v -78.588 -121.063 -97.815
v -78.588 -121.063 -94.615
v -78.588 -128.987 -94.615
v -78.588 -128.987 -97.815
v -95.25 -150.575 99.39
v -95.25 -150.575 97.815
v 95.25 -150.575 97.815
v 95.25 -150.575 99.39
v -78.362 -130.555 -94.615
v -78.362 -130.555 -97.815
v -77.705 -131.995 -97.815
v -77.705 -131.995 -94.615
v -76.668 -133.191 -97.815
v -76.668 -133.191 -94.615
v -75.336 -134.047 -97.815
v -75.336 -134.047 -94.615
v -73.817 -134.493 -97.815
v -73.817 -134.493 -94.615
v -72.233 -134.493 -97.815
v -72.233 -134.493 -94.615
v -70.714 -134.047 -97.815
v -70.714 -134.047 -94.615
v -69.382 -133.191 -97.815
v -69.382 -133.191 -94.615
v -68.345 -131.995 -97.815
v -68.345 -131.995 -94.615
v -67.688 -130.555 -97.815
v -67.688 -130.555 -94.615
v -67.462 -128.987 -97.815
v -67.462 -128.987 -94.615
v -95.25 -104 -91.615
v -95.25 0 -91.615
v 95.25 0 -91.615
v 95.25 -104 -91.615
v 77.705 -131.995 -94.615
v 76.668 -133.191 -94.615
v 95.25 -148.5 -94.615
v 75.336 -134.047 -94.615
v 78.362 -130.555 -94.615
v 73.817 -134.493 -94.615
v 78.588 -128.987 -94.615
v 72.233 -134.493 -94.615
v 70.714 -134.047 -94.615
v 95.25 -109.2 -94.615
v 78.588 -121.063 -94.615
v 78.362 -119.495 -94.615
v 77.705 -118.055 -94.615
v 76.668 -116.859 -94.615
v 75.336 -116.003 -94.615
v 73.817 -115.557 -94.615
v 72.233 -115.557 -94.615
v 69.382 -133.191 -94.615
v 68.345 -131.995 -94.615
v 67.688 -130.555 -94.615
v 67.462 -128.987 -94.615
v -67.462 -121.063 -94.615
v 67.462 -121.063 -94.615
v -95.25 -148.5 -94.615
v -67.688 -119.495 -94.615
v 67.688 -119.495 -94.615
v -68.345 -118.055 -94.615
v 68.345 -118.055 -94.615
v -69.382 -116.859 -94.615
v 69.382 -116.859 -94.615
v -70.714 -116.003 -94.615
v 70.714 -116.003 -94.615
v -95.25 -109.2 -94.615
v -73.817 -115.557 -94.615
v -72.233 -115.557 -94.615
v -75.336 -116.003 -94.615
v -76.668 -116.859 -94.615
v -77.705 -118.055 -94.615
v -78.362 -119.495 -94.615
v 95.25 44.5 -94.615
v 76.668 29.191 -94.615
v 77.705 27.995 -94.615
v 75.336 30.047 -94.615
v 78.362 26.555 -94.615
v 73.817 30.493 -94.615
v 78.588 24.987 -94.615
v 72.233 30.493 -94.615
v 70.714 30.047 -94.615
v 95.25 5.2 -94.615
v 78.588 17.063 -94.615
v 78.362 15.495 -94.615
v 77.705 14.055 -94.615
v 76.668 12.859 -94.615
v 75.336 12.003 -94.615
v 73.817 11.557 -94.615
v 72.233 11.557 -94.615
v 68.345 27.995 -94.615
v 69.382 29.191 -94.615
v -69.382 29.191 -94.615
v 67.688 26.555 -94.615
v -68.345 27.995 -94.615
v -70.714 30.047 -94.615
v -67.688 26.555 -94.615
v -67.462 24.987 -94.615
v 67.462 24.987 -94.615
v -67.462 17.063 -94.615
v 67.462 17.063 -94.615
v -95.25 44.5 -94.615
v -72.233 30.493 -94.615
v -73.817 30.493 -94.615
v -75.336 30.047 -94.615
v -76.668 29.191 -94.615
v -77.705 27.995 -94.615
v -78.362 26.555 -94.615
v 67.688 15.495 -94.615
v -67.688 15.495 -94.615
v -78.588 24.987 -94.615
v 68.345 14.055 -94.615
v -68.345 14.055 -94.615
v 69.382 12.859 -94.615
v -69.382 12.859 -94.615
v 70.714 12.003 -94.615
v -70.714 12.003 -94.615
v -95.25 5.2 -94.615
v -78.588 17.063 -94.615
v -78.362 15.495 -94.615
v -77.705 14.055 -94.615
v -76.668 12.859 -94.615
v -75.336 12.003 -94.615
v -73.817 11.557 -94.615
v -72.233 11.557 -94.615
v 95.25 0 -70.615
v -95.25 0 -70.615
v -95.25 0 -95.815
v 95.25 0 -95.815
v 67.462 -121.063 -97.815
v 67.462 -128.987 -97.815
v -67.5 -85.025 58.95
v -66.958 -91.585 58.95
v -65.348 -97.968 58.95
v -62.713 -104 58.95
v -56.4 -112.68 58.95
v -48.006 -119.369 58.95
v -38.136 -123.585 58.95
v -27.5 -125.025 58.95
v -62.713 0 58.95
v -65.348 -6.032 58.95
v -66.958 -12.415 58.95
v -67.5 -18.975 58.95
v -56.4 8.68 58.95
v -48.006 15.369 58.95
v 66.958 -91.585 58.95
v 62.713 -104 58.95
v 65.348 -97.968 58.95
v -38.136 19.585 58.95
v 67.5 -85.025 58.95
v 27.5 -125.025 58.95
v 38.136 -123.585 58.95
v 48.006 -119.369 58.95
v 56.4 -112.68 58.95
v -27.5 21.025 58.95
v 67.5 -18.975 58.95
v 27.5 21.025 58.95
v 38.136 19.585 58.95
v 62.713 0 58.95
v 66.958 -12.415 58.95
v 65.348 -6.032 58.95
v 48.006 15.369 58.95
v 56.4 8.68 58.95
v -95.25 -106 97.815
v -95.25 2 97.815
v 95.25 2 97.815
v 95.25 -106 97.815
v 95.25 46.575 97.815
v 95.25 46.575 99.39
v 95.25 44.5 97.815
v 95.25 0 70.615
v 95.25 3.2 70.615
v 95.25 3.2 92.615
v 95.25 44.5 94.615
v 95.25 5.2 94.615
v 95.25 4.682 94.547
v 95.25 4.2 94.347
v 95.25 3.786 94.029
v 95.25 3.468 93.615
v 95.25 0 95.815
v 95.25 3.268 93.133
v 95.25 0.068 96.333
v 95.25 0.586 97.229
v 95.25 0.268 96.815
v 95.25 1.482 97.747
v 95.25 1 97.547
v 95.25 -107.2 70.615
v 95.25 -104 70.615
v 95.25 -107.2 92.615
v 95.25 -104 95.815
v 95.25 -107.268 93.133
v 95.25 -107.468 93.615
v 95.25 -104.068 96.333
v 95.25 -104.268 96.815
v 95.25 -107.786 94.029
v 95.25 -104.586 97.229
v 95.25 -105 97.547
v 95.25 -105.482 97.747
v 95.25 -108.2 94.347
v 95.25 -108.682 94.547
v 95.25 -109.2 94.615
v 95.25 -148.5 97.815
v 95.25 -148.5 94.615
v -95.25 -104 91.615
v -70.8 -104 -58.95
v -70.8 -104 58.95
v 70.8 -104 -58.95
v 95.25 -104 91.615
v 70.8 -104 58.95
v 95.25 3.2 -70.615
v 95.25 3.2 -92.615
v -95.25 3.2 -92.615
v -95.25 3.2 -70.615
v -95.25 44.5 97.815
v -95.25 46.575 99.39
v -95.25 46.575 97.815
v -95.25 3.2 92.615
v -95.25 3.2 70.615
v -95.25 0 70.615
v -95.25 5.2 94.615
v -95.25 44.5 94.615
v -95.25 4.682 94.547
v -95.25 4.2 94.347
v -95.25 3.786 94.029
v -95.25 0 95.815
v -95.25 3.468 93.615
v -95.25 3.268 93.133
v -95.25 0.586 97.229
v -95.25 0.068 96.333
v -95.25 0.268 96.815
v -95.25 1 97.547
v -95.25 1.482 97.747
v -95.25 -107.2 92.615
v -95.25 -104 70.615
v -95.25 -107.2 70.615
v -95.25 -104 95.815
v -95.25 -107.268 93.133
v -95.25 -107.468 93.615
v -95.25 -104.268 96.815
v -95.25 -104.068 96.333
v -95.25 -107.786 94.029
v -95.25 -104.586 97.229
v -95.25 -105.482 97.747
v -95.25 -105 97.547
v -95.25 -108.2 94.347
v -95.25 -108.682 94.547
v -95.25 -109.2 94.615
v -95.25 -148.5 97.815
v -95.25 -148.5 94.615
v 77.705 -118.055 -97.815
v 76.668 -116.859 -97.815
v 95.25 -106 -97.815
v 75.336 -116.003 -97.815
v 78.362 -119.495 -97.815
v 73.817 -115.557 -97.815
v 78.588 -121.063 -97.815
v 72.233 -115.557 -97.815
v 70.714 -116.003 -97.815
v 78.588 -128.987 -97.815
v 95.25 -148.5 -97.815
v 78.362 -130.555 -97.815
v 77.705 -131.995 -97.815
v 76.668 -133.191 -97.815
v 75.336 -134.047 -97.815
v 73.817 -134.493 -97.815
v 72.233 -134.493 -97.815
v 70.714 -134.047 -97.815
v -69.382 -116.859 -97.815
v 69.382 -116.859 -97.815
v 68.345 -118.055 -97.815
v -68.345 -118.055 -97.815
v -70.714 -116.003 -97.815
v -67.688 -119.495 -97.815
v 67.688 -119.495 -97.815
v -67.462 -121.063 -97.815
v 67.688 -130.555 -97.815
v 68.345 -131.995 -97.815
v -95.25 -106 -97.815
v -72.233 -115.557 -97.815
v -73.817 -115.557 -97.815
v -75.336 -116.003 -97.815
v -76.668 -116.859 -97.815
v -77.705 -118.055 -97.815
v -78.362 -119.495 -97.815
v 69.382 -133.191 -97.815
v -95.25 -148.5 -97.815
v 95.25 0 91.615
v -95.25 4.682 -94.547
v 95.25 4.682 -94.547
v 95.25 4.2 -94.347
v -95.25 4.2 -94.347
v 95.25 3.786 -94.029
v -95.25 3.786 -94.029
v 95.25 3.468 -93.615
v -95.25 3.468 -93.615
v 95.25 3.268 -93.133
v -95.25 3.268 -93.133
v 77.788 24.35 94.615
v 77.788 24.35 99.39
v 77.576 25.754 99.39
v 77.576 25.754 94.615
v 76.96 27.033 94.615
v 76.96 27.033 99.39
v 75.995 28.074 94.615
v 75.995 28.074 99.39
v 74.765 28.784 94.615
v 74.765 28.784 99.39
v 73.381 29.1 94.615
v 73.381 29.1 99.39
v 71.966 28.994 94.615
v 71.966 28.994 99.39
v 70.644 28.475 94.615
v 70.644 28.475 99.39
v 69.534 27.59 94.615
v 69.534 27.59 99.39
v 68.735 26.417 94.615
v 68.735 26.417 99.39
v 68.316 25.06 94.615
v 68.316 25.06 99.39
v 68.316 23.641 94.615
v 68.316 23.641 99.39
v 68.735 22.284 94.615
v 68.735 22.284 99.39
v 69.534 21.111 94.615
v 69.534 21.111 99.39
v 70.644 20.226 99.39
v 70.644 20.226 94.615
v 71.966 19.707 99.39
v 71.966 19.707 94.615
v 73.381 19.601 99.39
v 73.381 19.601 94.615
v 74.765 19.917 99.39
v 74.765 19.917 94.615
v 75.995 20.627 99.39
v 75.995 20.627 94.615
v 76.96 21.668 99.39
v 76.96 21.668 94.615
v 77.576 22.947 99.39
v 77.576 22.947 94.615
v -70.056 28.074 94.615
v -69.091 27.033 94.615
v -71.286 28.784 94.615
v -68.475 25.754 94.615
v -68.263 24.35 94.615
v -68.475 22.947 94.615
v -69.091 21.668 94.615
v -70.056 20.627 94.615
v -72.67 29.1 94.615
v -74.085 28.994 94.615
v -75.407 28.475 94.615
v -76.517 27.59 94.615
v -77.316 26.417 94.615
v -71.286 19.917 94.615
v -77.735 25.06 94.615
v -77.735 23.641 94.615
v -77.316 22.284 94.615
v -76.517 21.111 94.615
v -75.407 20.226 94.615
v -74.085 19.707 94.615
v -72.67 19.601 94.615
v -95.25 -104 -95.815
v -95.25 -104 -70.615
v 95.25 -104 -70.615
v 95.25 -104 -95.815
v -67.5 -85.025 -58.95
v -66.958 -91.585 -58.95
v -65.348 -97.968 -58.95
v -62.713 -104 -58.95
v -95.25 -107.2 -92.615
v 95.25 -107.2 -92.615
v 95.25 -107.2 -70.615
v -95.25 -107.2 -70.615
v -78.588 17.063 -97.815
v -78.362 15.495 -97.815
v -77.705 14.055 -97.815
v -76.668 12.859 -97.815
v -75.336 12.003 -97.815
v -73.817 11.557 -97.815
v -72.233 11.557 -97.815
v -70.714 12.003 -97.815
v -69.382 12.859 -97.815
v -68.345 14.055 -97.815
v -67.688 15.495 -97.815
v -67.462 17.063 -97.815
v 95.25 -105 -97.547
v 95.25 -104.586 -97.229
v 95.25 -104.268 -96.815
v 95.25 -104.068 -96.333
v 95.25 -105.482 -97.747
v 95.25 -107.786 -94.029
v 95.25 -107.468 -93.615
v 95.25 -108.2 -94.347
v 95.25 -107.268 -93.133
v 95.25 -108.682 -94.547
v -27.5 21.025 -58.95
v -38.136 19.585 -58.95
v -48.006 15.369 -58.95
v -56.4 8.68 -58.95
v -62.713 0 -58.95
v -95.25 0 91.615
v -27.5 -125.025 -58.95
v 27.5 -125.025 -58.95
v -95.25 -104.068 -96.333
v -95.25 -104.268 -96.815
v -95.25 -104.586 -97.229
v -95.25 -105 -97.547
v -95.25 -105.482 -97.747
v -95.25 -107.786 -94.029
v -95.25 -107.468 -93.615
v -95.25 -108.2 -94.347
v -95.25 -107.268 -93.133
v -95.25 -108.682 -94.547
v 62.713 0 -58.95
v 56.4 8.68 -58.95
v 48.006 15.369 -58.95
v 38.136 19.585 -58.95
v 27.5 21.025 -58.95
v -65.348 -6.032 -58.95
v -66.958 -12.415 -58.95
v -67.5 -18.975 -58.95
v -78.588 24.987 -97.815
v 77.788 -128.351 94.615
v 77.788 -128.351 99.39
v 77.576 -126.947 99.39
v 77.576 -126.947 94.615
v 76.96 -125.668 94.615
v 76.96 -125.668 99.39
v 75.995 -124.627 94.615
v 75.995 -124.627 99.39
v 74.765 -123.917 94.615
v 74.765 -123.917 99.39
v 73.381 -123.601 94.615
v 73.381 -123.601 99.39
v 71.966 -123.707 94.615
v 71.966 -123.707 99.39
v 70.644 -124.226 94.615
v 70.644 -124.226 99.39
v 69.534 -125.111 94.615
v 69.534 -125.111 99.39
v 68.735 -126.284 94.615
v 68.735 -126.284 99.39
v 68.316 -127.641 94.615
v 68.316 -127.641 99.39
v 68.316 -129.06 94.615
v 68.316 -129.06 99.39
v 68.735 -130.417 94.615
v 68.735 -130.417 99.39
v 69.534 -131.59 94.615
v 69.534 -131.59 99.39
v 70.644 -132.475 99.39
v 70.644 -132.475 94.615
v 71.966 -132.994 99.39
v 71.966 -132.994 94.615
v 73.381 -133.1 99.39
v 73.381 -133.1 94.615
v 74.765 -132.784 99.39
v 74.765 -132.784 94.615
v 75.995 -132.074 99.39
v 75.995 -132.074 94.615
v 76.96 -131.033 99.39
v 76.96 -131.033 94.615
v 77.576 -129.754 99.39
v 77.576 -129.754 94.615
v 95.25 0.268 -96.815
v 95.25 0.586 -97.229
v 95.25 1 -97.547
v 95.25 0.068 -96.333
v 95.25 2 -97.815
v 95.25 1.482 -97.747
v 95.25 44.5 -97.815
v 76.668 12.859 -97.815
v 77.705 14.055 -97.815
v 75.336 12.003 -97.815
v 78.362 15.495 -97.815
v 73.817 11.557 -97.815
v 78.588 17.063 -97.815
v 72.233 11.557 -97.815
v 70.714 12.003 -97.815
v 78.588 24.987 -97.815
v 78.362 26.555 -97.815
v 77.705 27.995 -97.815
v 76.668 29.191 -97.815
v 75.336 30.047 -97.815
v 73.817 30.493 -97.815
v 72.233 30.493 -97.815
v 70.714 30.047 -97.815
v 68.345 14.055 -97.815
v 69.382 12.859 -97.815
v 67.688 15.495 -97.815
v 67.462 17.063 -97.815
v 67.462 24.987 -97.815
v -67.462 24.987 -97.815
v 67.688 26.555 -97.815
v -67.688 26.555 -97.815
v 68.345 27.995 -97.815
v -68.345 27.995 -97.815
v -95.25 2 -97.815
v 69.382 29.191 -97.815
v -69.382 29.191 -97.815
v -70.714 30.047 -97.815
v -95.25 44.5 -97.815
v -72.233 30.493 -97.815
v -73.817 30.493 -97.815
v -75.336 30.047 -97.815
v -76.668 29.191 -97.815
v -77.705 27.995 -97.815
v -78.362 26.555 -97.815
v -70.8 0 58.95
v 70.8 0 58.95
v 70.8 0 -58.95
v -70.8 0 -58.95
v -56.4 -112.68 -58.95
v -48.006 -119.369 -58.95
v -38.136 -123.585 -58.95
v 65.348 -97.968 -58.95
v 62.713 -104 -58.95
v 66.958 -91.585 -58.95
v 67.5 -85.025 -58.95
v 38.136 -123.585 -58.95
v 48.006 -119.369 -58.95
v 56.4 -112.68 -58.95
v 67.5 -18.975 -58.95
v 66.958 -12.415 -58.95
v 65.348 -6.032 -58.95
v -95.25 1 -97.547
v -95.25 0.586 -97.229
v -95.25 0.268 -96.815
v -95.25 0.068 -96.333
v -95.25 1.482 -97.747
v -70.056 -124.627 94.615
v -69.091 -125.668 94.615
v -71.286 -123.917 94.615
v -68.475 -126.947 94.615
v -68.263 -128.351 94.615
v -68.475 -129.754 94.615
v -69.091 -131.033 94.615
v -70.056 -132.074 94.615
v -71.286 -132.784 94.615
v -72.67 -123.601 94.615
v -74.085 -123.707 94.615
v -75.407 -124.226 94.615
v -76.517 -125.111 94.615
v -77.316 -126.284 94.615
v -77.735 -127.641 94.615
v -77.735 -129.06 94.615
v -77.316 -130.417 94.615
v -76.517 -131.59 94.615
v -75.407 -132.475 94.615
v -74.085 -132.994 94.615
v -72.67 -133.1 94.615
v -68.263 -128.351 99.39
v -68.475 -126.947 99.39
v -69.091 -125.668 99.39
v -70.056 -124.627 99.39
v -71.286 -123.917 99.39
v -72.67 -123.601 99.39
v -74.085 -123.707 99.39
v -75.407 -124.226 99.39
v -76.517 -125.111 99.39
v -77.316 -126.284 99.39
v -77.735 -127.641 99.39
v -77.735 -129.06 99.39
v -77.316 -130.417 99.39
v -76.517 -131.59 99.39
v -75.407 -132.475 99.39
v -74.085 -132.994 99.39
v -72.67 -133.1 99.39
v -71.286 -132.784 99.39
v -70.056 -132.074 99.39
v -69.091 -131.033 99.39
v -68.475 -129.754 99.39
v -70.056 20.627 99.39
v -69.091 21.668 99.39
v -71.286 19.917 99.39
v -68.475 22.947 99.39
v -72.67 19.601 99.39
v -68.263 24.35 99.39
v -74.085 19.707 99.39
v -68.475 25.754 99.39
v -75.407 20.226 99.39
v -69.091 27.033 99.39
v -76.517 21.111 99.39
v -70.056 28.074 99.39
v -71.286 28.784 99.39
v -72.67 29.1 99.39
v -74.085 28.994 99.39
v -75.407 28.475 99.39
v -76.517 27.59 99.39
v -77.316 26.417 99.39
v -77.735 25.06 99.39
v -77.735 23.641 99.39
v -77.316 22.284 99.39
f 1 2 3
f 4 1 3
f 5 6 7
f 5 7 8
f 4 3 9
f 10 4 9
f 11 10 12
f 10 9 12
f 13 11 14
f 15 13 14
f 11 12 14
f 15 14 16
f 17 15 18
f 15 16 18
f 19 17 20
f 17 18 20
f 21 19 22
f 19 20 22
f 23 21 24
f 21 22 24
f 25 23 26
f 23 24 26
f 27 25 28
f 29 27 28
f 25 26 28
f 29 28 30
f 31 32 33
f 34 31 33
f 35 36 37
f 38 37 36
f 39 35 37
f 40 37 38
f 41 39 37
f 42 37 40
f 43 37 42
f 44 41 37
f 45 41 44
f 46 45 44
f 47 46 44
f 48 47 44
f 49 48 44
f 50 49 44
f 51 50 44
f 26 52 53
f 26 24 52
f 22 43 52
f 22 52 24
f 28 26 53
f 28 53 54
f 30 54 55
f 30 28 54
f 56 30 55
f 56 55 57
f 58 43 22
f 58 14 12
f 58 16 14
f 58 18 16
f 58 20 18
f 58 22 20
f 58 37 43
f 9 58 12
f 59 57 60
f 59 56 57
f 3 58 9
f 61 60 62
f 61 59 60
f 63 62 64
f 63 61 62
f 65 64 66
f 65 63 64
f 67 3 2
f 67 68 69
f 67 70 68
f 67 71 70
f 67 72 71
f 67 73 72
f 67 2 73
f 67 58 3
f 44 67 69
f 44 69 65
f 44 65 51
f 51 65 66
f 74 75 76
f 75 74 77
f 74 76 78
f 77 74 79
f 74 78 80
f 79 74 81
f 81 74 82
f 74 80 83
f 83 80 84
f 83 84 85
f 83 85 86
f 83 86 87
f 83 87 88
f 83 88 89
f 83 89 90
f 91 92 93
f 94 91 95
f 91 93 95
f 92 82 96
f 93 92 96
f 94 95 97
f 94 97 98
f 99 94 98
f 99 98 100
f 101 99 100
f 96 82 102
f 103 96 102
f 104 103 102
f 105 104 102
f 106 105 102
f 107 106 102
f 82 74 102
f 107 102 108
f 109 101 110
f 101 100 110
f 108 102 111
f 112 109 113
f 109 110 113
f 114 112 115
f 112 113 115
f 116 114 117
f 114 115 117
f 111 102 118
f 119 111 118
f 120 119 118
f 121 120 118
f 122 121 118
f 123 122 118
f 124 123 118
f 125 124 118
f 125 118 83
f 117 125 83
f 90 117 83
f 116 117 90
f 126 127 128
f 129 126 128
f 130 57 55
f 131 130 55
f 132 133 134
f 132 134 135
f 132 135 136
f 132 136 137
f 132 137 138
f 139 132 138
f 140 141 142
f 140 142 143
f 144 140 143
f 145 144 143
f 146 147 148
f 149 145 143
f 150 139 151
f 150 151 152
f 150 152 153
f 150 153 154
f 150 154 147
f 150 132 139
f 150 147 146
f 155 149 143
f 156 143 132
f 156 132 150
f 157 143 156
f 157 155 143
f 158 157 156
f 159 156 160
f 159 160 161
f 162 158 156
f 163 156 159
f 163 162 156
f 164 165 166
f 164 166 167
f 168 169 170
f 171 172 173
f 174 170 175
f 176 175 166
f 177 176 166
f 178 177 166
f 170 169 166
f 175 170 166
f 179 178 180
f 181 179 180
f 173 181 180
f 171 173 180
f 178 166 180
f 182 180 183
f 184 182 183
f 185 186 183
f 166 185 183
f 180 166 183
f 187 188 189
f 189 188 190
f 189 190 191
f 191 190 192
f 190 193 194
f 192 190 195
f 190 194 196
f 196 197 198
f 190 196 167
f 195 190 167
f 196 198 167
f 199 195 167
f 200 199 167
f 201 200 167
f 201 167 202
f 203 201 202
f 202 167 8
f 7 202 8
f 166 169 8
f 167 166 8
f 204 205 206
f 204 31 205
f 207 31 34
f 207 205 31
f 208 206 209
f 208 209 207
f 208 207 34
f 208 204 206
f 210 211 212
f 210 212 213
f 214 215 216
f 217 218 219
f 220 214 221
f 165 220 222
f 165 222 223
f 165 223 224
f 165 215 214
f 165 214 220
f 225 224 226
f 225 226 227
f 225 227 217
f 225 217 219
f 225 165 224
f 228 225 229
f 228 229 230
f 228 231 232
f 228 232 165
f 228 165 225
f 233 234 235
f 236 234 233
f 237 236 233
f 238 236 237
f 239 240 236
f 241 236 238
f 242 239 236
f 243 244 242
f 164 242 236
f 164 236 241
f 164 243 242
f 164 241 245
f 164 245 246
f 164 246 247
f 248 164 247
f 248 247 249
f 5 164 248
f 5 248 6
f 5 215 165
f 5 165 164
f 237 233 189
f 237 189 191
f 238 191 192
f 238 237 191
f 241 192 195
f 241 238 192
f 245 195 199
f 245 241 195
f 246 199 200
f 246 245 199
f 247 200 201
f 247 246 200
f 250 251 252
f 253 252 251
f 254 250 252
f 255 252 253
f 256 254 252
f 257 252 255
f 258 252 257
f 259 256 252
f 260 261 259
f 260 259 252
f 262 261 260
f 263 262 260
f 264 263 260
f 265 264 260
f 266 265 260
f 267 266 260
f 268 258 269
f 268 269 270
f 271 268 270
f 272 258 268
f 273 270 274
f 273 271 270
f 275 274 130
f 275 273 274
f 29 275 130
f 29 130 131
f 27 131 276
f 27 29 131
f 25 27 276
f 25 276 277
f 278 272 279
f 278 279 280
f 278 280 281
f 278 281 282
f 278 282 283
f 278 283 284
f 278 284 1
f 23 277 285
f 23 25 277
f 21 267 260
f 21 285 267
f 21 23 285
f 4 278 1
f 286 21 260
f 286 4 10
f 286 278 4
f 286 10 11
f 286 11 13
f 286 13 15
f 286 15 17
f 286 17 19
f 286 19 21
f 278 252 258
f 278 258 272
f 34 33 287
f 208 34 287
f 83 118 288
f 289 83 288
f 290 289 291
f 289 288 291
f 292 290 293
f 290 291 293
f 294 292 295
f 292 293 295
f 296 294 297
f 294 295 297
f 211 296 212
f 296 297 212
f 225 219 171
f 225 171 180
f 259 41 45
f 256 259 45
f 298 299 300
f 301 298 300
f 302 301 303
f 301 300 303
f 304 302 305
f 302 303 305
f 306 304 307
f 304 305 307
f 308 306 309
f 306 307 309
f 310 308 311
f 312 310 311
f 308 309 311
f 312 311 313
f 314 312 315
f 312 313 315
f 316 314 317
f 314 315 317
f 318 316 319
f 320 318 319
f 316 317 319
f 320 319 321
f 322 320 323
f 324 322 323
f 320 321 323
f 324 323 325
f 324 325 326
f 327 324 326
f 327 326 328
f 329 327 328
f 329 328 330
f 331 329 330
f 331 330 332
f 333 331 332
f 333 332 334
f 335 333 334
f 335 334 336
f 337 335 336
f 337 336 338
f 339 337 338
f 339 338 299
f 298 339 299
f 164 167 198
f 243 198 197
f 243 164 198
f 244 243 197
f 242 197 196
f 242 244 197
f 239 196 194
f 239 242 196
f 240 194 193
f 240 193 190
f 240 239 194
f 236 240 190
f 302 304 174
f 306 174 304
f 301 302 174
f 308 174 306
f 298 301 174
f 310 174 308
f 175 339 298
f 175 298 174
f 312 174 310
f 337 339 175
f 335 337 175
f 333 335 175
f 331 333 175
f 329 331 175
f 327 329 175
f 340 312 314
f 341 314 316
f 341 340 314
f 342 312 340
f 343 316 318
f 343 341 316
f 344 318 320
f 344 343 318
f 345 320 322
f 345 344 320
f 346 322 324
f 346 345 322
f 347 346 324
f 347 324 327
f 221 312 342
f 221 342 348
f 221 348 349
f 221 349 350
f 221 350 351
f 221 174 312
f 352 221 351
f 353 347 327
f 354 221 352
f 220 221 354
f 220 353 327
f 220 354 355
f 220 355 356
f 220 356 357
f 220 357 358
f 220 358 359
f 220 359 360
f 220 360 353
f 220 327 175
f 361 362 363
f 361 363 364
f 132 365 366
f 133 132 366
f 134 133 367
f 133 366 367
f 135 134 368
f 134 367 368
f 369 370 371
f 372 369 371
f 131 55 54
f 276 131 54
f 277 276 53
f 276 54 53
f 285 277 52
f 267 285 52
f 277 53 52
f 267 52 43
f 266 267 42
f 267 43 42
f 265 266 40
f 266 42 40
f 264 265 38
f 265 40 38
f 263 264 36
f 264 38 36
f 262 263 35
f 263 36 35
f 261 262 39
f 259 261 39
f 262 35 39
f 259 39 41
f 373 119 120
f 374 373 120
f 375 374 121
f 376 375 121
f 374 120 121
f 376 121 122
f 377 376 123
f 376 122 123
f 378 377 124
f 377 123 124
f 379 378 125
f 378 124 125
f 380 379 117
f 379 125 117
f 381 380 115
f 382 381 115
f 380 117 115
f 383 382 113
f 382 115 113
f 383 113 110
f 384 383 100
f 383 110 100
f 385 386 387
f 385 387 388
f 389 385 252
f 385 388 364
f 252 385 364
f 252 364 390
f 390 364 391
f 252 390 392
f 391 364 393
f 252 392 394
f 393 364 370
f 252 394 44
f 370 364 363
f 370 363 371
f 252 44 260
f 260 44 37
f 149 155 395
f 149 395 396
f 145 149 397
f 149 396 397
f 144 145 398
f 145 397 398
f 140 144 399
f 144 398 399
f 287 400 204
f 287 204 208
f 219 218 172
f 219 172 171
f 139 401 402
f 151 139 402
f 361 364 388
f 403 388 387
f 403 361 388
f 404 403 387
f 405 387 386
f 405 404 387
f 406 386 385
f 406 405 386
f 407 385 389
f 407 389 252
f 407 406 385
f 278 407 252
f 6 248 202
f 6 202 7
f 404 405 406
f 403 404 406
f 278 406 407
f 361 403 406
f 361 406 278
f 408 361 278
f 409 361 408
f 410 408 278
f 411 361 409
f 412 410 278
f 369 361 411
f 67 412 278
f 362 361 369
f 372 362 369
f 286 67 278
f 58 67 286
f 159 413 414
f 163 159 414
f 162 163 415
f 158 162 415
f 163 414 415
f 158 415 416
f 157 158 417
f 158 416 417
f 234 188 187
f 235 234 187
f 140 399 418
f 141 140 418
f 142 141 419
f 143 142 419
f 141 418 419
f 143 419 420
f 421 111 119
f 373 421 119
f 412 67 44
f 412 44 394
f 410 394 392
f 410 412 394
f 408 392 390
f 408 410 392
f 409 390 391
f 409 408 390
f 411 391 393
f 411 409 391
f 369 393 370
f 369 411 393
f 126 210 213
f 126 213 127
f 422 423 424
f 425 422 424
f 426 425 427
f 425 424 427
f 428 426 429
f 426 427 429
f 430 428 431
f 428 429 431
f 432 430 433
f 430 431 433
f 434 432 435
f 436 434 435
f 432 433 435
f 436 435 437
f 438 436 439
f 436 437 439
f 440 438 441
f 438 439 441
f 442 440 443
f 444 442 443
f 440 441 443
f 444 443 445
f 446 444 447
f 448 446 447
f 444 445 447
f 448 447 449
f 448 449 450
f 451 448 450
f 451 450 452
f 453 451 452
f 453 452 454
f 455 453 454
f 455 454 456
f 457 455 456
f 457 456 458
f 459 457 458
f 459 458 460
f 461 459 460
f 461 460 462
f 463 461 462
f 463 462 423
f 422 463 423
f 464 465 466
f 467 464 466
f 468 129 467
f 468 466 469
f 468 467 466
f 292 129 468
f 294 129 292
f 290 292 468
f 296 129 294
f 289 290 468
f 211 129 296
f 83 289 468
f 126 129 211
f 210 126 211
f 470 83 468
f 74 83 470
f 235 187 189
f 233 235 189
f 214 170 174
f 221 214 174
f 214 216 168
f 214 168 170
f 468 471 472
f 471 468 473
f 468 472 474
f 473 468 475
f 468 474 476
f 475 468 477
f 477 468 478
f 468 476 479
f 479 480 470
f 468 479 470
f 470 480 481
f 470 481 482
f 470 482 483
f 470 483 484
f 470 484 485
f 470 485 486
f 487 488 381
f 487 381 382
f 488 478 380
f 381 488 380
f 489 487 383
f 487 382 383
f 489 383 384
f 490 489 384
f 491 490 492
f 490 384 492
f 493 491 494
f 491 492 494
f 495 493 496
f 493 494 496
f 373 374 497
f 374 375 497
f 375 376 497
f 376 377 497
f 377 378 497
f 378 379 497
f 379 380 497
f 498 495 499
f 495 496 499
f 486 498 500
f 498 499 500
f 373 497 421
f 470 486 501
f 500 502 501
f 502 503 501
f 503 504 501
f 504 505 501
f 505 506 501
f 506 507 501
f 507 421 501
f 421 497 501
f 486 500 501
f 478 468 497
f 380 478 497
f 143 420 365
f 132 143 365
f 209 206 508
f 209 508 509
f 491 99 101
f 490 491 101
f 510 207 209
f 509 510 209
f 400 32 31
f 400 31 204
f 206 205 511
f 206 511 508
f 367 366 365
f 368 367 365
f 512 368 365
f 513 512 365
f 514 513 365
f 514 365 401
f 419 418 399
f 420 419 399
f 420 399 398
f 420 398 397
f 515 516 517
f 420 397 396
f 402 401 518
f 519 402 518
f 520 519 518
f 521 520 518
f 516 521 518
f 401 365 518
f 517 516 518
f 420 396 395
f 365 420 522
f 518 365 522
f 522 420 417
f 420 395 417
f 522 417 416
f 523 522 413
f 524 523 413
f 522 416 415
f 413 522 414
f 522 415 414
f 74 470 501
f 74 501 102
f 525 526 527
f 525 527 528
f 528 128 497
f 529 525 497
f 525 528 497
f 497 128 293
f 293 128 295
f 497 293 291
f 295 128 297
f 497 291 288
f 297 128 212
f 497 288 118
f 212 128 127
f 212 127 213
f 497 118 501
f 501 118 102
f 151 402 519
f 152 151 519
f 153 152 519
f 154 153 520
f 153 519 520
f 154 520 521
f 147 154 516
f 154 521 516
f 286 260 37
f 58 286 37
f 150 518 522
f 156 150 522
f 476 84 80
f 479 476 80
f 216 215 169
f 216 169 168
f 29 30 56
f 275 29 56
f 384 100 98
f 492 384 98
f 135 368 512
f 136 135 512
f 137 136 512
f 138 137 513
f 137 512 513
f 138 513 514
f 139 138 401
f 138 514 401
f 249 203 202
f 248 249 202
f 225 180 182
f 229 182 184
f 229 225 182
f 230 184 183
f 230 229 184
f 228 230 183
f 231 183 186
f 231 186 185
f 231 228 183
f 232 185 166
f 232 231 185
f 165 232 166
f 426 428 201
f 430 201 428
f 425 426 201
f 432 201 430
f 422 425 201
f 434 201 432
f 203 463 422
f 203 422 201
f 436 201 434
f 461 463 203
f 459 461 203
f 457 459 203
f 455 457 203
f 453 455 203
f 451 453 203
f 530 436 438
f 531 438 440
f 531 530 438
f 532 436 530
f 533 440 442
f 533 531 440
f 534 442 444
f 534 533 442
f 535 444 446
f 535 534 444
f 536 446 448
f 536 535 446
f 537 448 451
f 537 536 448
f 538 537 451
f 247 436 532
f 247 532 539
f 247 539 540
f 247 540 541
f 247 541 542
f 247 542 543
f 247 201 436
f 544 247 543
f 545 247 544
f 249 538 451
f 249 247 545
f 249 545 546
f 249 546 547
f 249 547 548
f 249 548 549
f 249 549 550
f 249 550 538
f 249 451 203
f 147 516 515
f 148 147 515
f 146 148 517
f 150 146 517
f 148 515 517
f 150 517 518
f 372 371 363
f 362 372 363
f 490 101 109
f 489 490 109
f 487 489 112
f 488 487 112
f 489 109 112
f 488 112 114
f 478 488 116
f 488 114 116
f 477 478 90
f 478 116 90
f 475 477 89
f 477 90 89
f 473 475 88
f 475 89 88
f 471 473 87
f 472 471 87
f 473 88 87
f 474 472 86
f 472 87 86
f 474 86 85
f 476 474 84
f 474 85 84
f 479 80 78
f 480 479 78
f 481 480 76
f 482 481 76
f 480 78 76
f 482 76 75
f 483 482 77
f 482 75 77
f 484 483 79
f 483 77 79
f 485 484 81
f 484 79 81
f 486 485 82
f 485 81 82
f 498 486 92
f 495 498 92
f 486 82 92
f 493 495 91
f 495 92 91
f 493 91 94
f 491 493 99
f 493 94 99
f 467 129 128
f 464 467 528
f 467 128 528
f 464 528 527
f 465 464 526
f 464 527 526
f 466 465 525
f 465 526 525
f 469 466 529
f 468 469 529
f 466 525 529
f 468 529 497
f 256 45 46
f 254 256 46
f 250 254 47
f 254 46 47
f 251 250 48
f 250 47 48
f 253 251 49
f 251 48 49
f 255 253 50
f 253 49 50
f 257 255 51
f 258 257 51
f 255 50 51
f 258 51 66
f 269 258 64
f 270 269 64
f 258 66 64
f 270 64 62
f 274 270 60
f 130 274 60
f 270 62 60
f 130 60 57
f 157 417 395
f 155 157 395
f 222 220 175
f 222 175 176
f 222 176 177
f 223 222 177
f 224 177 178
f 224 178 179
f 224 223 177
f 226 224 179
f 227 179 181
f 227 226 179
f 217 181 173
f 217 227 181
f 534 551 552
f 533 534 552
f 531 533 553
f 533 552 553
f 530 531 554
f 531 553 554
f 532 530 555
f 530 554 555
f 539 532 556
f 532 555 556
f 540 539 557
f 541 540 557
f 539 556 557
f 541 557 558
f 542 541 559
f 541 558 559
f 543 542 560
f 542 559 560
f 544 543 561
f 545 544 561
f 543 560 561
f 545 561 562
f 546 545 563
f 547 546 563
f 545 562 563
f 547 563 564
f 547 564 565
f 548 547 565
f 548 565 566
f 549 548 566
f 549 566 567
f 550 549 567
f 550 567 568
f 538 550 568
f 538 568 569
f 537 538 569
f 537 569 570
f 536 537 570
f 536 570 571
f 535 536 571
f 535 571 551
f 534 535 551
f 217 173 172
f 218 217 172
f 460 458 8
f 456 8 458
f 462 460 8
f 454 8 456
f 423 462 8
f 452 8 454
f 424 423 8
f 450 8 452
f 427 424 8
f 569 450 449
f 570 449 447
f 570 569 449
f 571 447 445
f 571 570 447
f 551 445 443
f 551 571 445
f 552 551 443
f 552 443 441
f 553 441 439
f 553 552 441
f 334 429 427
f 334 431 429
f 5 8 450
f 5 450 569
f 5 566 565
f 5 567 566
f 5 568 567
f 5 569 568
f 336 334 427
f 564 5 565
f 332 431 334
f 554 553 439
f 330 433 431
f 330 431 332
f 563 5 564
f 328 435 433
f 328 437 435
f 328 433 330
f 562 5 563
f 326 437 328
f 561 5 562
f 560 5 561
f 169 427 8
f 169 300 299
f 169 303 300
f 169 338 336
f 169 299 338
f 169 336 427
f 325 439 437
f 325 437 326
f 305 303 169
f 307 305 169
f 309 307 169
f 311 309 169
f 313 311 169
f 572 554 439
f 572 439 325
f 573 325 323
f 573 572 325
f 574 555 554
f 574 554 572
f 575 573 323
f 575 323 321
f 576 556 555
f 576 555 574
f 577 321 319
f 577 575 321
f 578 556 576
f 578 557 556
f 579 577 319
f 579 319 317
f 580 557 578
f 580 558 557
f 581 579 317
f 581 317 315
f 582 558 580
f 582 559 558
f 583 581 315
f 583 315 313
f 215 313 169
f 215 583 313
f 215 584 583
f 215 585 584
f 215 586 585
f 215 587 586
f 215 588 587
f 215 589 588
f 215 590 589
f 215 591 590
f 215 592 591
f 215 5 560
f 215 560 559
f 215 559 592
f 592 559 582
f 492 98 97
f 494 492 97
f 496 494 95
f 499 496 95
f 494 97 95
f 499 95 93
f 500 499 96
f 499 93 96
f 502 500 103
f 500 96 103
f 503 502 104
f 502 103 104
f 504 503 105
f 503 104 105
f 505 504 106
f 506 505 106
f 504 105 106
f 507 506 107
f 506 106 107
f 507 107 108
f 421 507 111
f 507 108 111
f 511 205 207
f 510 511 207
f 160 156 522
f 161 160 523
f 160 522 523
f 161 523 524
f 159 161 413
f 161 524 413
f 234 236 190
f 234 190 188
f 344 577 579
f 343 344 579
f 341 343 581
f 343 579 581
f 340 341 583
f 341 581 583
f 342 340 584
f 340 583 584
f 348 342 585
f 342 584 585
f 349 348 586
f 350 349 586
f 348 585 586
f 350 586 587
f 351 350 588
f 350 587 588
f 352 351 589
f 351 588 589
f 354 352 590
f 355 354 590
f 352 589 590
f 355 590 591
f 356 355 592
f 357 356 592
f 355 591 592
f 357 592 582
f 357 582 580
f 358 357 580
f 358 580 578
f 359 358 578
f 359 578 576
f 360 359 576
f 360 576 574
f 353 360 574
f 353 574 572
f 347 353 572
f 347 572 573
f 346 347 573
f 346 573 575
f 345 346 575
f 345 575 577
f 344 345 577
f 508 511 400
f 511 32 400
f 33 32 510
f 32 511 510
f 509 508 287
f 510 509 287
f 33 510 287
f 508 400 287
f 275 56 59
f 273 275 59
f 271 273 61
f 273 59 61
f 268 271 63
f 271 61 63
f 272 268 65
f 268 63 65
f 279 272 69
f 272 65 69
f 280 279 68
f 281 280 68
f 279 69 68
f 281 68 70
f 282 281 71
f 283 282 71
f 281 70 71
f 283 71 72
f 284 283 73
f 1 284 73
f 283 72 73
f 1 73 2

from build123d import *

# Parameters (mm, degrees)
F0_W      = 190.5
F0_H      = 183.23
F1_DEPTH  = 104
F3_DEPTH  = 190.5
F9_DEPTH  = 3.201
F10_W     = 141.6
F10_H     = 117.9
F11_DEPTH = 150.576
F13_DEPTH = 117.9
F14_R     = 4.7625
F15_DEPTH = 25


with BuildPart() as f1:
    # F0 (on Front) → F1 (new body)
    with BuildSketch(Plane.XZ):
        Rectangle(F0_W, F0_H)
    extrude(amount=F1_DEPTH)

    # F10 (on face) → F11 (cut, through all)
    with BuildSketch(Plane.XZ.offset(104)):
        Rectangle(F10_W, F10_H)
    extrude(amount=-F11_DEPTH, mode=Mode.SUBTRACT)


with BuildPart() as f3:
    # F2 (on face) → F3 (new body, through all)
    with BuildSketch(Plane(origin=(-95.25, 0, 0), x_dir=(0, -1, 0), z_dir=(-1, 0, 0))):
        with BuildLine():
            Line((-3.2, 70.615), (0, 70.615))
            Line((0, 70.615), (0, 91.615))
            Line((0, 91.615), (0, 94.615))
            Line((0, 94.615), (0, 95.815))
            ThreePointArc((0, 95.815), (-0.5857864376, 97.2292135624), (-2, 97.815))
            Line((-2, 97.815), (-44.5, 97.815))
            Line((-44.5, 97.815), (-44.5, 94.615))
            Line((-44.5, 94.615), (-5.2, 94.615))
            ThreePointArc((-5.2, 94.615), (-3.7857864376, 94.0292135624), (-3.2, 92.615))
            Line((-3.2, 92.615), (-3.2, 70.615))
        make_face()
        with BuildLine():
            Line((104, 91.615), (104, 70.615))
            Line((104, 70.615), (107.2, 70.615))
            Line((107.2, 70.615), (107.2, 92.615))
            ThreePointArc((107.2, 92.615), (107.7857864376, 94.0292135624), (109.2, 94.615))
            Line((109.2, 94.615), (148.5, 94.615))
            Line((148.5, 94.615), (148.5, 97.815))
            Line((148.5, 97.815), (106, 97.815))
            ThreePointArc((106, 97.815), (104.5857864376, 97.2292135624), (104, 95.815))
            Line((104, 95.815), (104, 94.615))
            Line((104, 94.615), (104, 91.615))
        make_face()
        Polygon((-2, 97.815), (106, 97.815), (148.5, 97.815), (150.575, 97.815), (150.575, 99.39), (-46.575, 99.39), (-46.575, 97.815), (-44.5, 97.815), align=None)
    extrude(amount=-F3_DEPTH)

    # F14 (on face) → F15 (cut)
    with BuildSketch(Plane.XY.offset(99.39)):
        with Locations((-73.0255, 24.3505)):
            Circle(F14_R)
        with Locations((73.0255, 24.3505)):
            Circle(F14_R)
        with Locations((-73.0255, -128.3505)):
            Circle(F14_R)
        with Locations((73.0255, -128.3505)):
            Circle(F14_R)
    extrude(amount=-F15_DEPTH, mode=Mode.SUBTRACT)


with BuildPart() as f3b:
    # F2 (on face) → F3, piece 2 (new body, through all)
    with BuildSketch(Plane(origin=(-95.25, 0, 0), x_dir=(0, -1, 0), z_dir=(-1, 0, 0))):
        with BuildLine():
            Line((107.2, -70.615), (104, -70.615))
            Line((104, -70.615), (104, -91.615))
            Line((104, -91.615), (104, -94.615))
            Line((104, -94.615), (104, -95.815))
            ThreePointArc((104, -95.815), (104.5857864376, -97.2292135624), (106, -97.815))
            Line((106, -97.815), (148.5, -97.815))
            Line((148.5, -97.815), (148.5, -94.615))
            Line((148.5, -94.615), (109.2, -94.615))
            ThreePointArc((109.2, -94.615), (107.7857864376, -94.0292135624), (107.2, -92.615))
            Line((107.2, -92.615), (107.2, -70.615))
        make_face()
    extrude(amount=-F3_DEPTH)


with BuildPart() as f7_1:
    # F7: instance of F3b
    add(f3b.part.mirror(Plane(origin=(95.25, -52, 0), x_dir=(-1, 0, 0), z_dir=(0, 1, 0))))


with BuildPart() as f9_tool:
    # F8 (on face) → F9 (new body, through all)
    with BuildSketch(Plane.XY.offset(-94.615)):
        with BuildLine():
            Line((-67.4624, -128.9874), (-67.4624, -121.0626))
            ThreePointArc((-67.4624, -121.0626), (-73.025, -115.5), (-78.5876, -121.0626))
            Line((-78.5876, -121.0626), (-78.5876, -128.9874))
            ThreePointArc((-78.5876, -128.9874), (-73.025, -134.55), (-67.4624, -128.9874))
        make_face()
        with BuildLine():
            ThreePointArc((-67.4624, 24.9874), (-73.025, 30.55), (-78.5876, 24.9874))
            Line((-78.5876, 24.9874), (-78.5876, 17.0626))
            ThreePointArc((-78.5876, 17.0626), (-73.025, 11.5), (-67.4624, 17.0626))
            Line((-67.4624, 17.0626), (-67.4624, 24.9874))
        make_face()
        with BuildLine():
            ThreePointArc((78.5876, -121.0626), (73.025, -115.5), (67.4624, -121.0626))
            Line((67.4624, -121.0626), (67.4624, -128.9874))
            ThreePointArc((67.4624, -128.9874), (73.025, -134.55), (78.5876, -128.9874))
            Line((78.5876, -128.9874), (78.5876, -121.0626))
        make_face()
        with BuildLine():
            Line((67.4624, 24.9874), (67.4624, 17.0626))
            ThreePointArc((67.4624, 17.0626), (73.025, 11.5), (78.5876, 17.0626))
            Line((78.5876, 17.0626), (78.5876, 24.9874))
            ThreePointArc((78.5876, 24.9874), (73.025, 30.55), (67.4624, 24.9874))
        make_face()
    extrude(amount=-F9_DEPTH)


with BuildPart() as f3b_1:
    add(f3b.part)

    # F9: cut by f9_tool
    add(f9_tool.part, mode=Mode.SUBTRACT)


with BuildPart() as f7_1_1:
    add(f7_1.part)

    # F9: cut by f9_tool
    add(f9_tool.part, mode=Mode.SUBTRACT)


with BuildPart() as f13:
    # F12 (on face) → F13 (new body, through all)
    with BuildSketch(Plane.XY.offset(-58.95)):
        with BuildLine():
            ThreePointArc((-67.5, -85.025), (-66.2847688892, -94.8097688892), (-62.7129148893, -104))
            Line((-62.7129148893, -104), (62.7129148893, -104))
            ThreePointArc((62.7129148893, -104), (66.2847688892, -94.8097688892), (67.5, -85.025))
            Line((67.5, -85.025), (67.5, -18.975))
            ThreePointArc((67.5, -18.975), (66.2847688892, -9.1902311108), (62.7129148893, 0))
            Line((62.7129148893, 0), (-62.7129148893, 0))
            ThreePointArc((-62.7129148893, 0), (-66.2847688892, -9.1902311108), (-67.5, -18.975))
            Line((-67.5, -18.975), (-67.5, -85.025))
        make_face()
        with BuildLine():
            ThreePointArc((-27.5, 21.025), (-48.0060966544, 15.3688495221), (-62.7129148893, 0))
            Line((-62.7129148893, 0), (62.7129148893, 0))
            ThreePointArc((62.7129148893, 0), (48.0060966544, 15.3688495221), (27.5, 21.025))
            Line((27.5, 21.025), (-27.5, 21.025))
        make_face()
        with BuildLine():
            ThreePointArc((-62.7129148893, -104), (-48.0060966544, -119.3688495221), (-27.5, -125.025))
            Line((-27.5, -125.025), (27.5, -125.025))
            ThreePointArc((27.5, -125.025), (48.0060966544, -119.3688495221), (62.7129148893, -104))
            Line((62.7129148893, -104), (-62.7129148893, -104))
        make_face()
    extrude(amount=F13_DEPTH)


solid = Compound([f1.part, f3.part, f3b_1.part, f7_1_1.part, f13.part])
